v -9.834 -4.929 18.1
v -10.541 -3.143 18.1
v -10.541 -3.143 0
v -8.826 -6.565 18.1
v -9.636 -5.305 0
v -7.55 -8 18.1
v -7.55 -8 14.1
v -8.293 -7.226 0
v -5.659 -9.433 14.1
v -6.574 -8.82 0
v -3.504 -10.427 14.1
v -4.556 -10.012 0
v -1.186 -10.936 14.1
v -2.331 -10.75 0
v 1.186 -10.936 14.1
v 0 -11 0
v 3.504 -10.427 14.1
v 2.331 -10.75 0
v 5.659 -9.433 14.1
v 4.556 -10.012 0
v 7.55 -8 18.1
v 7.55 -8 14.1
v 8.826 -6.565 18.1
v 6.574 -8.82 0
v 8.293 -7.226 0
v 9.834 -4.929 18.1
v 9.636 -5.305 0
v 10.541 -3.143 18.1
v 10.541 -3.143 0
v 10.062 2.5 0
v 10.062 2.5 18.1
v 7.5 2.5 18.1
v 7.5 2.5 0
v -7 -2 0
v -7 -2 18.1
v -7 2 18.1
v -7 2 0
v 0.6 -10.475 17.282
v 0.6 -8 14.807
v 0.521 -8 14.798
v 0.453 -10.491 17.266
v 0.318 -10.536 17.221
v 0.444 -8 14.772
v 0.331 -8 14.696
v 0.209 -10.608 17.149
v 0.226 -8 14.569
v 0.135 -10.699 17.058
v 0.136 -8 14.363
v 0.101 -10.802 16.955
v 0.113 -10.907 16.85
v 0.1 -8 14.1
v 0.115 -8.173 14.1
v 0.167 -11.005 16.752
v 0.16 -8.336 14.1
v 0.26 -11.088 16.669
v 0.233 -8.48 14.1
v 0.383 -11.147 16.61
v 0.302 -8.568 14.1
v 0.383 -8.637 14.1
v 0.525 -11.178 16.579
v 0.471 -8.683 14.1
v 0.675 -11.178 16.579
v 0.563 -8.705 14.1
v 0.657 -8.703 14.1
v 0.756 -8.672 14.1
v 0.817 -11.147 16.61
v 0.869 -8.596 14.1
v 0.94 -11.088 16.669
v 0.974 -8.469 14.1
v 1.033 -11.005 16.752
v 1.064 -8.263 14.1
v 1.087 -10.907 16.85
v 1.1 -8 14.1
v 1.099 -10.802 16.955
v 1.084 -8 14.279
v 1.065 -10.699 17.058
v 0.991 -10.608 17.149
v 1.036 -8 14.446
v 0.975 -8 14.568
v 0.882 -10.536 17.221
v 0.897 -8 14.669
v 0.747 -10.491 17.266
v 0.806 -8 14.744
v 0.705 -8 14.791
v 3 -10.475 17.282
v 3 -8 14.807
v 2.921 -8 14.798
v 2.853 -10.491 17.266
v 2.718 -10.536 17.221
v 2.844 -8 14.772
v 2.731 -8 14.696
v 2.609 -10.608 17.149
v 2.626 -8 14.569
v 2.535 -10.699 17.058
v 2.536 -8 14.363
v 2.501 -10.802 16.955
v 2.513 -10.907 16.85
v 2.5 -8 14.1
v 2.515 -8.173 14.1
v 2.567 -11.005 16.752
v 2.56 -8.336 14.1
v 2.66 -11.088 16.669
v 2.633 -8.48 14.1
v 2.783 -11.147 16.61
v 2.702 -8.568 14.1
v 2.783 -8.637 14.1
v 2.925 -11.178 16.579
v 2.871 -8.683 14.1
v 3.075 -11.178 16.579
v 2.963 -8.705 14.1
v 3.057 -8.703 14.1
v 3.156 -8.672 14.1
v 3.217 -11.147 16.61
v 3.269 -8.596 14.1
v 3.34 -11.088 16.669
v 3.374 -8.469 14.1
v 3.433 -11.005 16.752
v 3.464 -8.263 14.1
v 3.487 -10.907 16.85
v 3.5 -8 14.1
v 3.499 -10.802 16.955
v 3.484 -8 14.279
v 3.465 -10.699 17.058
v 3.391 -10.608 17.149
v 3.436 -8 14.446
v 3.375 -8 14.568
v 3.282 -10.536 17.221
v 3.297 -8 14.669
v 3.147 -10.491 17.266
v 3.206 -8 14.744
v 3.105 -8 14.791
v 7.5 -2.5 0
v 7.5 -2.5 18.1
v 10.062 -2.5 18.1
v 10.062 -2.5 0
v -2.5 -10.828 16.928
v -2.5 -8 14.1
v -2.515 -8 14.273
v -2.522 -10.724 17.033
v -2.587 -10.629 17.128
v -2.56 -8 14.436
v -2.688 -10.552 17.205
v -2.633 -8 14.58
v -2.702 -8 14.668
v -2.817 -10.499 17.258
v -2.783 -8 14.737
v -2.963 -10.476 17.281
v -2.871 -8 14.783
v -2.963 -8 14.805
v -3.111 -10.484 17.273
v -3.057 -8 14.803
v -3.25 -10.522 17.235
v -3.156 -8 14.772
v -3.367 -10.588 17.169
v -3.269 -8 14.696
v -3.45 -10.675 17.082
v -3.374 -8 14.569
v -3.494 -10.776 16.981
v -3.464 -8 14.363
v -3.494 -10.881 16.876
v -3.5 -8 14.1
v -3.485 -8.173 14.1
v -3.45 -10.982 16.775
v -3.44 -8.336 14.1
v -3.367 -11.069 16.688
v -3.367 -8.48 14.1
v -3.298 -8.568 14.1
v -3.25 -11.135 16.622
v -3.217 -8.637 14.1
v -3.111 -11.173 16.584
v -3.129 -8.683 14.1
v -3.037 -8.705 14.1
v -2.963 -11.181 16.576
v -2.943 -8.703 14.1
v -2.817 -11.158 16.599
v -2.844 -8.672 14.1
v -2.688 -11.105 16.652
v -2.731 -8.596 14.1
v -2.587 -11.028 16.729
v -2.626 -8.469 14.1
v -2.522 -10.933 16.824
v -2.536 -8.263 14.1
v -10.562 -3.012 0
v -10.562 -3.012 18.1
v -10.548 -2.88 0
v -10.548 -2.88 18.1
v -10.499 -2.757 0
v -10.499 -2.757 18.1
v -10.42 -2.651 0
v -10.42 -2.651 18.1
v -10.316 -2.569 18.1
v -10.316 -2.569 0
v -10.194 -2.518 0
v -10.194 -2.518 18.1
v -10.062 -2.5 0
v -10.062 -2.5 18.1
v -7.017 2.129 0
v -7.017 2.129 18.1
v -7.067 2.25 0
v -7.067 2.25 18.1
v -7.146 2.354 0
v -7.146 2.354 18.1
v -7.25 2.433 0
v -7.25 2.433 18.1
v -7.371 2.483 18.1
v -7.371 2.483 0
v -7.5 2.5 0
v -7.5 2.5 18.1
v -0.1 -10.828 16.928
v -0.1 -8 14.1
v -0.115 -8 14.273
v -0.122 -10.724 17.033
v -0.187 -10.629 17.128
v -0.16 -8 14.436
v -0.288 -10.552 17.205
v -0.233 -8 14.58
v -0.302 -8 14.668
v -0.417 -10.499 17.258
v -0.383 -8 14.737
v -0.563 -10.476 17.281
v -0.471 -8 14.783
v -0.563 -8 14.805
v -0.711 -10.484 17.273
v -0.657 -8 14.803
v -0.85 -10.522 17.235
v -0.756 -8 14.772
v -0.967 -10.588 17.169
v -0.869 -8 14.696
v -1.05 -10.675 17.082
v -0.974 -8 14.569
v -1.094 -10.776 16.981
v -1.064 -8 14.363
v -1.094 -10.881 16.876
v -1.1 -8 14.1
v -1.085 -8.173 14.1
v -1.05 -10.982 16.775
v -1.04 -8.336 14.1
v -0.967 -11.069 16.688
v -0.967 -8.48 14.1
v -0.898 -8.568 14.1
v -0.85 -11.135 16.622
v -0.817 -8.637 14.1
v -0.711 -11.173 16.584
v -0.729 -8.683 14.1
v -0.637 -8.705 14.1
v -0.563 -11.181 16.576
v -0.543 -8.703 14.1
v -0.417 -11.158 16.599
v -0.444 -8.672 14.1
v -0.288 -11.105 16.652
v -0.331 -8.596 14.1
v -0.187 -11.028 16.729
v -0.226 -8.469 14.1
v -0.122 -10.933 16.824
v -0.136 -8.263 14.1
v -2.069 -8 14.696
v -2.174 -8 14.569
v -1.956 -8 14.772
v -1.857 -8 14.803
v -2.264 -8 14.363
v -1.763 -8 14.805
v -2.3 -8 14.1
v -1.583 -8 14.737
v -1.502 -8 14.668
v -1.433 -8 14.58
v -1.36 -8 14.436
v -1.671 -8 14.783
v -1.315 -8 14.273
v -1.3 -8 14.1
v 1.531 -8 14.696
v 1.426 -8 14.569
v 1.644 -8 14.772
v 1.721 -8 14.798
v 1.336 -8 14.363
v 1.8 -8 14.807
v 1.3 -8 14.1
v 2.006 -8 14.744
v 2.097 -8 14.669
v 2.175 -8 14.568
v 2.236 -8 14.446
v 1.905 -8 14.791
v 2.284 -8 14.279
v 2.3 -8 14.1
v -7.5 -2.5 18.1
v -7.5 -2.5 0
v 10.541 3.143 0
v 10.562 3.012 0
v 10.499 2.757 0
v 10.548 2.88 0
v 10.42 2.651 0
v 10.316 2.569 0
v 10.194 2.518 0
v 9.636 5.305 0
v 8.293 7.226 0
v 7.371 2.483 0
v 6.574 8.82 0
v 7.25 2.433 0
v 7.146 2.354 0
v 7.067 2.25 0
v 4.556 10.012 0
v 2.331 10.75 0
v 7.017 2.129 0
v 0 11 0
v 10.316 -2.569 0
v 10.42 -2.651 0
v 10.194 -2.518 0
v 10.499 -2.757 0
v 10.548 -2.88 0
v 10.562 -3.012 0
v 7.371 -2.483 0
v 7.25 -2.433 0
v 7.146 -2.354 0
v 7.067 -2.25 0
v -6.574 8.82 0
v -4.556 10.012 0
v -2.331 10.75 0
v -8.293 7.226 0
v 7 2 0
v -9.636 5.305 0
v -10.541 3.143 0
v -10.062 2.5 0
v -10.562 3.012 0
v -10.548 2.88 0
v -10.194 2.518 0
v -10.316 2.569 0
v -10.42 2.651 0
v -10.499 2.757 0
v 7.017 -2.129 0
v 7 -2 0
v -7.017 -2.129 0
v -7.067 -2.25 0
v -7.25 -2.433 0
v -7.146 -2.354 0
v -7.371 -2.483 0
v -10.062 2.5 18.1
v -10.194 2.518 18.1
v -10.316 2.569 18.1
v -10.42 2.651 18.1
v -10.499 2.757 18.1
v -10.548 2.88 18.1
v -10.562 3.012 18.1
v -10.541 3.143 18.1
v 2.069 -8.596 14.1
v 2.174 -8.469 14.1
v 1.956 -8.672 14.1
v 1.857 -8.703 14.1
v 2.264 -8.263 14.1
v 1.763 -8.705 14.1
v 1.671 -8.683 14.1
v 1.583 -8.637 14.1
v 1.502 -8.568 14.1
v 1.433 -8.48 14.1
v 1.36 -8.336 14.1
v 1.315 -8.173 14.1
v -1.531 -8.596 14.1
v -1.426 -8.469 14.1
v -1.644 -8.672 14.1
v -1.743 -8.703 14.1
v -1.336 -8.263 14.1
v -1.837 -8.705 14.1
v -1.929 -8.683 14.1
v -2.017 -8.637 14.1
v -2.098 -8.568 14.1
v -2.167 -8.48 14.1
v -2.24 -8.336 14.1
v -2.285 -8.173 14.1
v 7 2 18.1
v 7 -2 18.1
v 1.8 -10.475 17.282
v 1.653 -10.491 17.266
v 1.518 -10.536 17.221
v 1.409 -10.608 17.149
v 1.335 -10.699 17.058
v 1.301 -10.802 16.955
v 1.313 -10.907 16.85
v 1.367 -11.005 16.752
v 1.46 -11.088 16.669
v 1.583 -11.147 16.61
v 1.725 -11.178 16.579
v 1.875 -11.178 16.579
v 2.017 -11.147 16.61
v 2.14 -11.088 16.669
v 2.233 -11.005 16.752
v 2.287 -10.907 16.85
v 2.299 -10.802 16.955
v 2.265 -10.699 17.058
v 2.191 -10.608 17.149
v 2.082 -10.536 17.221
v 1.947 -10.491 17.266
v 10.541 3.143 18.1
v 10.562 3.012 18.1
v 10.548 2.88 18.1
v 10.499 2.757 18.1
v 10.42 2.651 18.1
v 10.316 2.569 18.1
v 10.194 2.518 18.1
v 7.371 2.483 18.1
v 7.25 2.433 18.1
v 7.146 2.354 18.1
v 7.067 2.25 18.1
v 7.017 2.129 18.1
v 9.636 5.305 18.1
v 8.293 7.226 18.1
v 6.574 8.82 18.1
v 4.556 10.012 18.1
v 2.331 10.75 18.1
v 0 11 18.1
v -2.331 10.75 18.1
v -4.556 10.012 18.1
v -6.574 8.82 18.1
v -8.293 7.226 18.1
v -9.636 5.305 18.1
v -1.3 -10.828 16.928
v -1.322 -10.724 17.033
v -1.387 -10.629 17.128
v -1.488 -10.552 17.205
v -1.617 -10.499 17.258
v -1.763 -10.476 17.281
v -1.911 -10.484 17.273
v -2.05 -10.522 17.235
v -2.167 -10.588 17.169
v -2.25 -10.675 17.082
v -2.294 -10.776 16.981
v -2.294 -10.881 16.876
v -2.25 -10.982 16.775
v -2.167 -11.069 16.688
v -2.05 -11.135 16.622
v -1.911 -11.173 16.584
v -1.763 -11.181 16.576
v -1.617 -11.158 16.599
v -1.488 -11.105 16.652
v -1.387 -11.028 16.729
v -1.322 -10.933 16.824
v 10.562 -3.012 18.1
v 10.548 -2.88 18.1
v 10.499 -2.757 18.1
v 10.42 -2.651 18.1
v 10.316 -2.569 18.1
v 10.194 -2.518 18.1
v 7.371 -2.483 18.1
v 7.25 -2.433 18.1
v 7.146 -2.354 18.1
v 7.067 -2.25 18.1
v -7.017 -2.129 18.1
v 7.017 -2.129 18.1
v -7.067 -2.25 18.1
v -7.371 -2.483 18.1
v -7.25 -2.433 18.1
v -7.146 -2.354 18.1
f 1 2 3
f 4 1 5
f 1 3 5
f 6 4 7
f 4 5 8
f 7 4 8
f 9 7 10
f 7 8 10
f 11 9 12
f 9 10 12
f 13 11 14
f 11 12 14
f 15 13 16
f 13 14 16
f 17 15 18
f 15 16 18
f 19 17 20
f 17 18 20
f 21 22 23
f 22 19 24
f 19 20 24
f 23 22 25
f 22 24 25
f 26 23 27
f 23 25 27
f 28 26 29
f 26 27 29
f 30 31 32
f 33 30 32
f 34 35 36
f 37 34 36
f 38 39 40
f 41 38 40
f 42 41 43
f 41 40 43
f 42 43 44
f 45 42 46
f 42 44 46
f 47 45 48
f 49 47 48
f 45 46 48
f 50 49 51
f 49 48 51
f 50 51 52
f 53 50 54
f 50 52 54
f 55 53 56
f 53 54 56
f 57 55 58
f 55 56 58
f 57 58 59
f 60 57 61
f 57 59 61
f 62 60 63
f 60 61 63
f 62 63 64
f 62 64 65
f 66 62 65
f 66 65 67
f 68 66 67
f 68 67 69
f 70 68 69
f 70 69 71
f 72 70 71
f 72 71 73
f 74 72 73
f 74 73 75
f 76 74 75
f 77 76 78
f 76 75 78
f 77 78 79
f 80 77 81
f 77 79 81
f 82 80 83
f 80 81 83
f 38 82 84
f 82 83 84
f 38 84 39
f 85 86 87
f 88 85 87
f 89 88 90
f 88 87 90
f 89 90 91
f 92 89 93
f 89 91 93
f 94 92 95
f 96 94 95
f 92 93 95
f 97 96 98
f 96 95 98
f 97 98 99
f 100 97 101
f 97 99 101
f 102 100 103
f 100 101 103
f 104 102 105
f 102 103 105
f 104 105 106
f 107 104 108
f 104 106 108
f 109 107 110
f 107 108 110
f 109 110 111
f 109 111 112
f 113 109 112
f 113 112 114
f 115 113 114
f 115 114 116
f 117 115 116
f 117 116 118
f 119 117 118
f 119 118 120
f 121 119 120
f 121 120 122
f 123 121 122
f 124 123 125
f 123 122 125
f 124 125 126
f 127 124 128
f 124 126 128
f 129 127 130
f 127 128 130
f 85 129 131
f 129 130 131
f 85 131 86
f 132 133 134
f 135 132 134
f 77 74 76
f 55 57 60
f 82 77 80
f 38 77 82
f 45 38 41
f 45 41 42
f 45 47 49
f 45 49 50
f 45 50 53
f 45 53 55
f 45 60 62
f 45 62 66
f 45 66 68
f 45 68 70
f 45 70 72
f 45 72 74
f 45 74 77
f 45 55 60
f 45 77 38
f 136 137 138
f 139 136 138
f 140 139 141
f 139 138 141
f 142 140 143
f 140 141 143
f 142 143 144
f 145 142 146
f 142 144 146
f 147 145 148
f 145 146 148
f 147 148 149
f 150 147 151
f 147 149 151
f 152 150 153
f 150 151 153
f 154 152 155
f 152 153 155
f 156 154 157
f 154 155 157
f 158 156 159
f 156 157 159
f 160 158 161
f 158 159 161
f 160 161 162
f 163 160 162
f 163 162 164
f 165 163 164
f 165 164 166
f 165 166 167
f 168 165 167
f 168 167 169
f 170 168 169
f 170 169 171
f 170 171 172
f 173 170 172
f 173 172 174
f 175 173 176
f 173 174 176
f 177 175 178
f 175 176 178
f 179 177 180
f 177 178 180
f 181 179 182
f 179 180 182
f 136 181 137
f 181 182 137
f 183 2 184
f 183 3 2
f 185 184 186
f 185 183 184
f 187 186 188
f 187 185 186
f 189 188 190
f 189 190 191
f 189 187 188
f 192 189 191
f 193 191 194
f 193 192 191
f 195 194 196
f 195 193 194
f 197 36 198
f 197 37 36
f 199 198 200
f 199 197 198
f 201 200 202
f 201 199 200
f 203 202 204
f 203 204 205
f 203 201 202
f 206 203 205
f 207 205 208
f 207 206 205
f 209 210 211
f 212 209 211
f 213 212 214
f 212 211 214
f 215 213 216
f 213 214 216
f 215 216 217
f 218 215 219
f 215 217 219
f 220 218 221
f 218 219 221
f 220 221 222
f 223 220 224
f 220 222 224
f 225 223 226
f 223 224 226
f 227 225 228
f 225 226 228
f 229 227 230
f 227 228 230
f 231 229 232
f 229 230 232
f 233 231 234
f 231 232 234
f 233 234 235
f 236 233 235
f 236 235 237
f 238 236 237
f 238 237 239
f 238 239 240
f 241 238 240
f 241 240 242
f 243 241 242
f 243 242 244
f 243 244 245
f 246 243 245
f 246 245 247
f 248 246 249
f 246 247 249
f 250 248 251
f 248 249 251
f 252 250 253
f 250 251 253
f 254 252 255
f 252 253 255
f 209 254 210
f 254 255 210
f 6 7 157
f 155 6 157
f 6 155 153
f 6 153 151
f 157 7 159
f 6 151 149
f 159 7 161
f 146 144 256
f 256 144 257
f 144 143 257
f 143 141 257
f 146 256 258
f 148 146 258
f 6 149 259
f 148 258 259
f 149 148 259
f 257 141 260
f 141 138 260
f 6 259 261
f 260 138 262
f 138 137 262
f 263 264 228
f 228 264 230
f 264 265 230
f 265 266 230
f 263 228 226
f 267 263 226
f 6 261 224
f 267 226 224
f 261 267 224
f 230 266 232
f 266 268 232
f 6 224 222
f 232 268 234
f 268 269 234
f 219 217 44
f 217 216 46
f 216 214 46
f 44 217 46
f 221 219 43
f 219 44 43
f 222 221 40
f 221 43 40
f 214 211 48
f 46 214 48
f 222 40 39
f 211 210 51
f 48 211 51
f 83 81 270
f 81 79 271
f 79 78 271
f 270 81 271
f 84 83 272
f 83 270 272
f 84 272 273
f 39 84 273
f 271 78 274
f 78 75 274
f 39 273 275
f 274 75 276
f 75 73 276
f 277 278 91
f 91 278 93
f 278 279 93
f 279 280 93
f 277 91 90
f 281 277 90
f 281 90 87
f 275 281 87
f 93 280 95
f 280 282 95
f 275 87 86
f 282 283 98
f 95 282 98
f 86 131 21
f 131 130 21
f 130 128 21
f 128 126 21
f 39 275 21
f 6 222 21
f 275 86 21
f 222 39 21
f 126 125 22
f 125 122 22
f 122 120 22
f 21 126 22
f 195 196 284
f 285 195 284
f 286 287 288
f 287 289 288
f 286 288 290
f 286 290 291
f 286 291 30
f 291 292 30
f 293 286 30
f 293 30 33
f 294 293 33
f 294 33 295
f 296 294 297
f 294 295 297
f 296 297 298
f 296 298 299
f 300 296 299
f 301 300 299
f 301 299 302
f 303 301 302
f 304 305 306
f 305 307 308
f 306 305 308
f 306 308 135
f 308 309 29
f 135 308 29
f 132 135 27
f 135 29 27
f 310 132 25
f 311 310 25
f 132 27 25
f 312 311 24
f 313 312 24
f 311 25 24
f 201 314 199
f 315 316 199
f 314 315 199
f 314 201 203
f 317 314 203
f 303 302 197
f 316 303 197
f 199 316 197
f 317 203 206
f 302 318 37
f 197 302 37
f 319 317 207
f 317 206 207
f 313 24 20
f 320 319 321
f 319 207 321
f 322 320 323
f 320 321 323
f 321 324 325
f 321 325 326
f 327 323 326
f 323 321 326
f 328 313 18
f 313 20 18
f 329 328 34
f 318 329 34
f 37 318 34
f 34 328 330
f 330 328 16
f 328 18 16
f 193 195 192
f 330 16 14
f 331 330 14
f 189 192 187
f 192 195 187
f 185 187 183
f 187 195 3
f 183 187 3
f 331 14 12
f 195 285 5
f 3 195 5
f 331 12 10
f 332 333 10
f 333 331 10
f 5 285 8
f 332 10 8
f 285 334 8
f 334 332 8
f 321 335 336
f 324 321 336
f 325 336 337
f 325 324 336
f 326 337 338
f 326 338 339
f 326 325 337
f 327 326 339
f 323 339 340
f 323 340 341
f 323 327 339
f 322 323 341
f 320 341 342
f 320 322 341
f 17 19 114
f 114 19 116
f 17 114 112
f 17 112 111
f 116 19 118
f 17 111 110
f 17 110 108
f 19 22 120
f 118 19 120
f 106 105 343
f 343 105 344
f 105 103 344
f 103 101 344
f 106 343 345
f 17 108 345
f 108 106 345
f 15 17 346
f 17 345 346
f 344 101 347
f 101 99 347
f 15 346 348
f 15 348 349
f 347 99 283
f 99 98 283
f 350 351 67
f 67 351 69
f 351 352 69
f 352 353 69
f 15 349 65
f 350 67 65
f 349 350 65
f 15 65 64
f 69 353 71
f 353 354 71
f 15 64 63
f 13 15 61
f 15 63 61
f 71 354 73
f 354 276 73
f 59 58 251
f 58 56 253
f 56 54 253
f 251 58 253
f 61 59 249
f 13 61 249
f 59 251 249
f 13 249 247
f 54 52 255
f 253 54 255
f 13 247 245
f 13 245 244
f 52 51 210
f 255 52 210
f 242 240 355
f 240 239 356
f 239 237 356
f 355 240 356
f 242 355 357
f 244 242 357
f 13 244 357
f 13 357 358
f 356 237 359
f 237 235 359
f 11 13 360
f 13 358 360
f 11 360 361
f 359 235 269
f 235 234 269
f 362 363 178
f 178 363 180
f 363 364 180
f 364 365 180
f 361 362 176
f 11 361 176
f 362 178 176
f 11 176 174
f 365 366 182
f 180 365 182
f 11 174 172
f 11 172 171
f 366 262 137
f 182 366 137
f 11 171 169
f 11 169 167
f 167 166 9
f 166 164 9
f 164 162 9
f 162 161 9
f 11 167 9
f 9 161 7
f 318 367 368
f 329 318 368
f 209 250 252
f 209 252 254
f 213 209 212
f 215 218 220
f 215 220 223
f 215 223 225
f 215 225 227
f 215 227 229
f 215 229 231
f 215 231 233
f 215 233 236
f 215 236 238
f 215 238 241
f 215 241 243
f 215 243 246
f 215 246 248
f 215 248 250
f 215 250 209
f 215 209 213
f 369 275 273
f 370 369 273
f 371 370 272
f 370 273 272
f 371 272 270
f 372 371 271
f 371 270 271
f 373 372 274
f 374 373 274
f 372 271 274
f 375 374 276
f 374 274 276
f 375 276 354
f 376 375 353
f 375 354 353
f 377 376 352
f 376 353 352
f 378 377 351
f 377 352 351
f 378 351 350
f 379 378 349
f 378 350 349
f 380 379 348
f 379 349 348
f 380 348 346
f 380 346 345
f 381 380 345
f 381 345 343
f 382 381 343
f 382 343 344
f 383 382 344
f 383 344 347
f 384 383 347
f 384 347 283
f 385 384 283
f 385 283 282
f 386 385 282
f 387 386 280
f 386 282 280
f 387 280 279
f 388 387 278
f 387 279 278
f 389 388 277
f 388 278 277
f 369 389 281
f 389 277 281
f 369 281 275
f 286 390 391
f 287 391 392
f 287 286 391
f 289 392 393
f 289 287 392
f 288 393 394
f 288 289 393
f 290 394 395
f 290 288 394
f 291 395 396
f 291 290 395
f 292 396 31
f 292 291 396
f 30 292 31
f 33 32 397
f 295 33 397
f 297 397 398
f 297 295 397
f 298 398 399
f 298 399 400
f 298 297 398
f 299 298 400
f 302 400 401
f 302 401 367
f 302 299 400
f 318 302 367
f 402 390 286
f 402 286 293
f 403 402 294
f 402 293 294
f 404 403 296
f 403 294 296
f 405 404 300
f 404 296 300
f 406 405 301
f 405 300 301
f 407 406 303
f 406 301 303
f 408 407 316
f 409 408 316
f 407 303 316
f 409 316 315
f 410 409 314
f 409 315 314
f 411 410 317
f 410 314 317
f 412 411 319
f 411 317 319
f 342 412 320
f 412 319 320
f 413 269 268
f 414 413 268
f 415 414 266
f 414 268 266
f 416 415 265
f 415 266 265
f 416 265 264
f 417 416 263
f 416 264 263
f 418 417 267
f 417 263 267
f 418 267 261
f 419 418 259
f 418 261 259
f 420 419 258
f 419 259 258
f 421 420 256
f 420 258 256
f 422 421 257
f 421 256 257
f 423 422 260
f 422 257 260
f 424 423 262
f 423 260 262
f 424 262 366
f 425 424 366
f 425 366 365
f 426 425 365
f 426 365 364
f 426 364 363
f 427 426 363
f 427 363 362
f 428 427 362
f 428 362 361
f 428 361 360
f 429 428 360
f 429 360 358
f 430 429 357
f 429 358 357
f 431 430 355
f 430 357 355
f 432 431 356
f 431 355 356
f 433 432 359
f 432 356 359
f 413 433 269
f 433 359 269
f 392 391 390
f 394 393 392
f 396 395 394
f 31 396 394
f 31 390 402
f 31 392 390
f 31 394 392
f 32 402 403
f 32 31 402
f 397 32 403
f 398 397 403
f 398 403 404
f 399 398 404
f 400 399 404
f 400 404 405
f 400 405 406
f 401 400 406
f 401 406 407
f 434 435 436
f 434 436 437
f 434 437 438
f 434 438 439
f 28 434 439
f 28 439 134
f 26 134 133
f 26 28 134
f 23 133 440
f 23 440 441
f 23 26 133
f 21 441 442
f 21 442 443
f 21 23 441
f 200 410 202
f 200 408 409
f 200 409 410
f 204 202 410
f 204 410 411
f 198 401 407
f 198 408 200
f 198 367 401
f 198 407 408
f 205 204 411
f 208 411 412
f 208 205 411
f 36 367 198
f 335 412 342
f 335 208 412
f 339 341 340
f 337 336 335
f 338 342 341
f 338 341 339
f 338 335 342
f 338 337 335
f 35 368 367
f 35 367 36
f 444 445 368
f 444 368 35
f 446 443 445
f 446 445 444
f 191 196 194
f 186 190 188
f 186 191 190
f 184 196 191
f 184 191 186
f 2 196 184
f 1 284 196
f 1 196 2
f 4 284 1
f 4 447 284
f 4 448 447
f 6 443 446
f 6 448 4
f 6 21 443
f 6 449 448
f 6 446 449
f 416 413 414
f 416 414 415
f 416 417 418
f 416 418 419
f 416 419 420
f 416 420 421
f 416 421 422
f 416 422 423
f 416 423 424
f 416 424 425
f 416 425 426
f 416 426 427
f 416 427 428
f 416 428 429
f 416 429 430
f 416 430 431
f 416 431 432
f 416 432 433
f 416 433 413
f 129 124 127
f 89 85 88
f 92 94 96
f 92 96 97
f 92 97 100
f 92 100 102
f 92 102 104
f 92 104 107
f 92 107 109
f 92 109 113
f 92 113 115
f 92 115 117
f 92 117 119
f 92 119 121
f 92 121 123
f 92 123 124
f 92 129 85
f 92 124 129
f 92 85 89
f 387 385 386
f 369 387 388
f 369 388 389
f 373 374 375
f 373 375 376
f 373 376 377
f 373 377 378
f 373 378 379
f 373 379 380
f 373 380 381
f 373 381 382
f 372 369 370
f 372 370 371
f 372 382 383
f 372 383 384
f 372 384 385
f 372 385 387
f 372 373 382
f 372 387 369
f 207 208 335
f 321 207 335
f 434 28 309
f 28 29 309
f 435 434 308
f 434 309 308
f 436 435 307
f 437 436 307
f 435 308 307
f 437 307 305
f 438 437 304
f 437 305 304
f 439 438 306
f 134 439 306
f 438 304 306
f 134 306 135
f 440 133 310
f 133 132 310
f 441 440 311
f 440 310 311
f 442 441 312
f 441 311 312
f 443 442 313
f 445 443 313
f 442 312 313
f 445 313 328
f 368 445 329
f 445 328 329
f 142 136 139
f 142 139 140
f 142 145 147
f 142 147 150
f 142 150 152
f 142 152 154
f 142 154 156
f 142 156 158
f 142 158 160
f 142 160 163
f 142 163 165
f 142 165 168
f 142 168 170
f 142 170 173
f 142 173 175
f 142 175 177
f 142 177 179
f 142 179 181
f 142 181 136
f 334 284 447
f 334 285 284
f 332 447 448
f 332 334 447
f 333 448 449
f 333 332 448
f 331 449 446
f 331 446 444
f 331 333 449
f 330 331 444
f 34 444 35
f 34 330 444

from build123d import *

# Parameters (mm, degrees)
ESQUISSE1_R             = 11
BOSS_EXTRU_1_DEPTH      = 18.1
ENL_V_MAT_EXTRU_2_DEPTH = 24.866503724
ENL_V_START             = -4
ENL_V_MAT_EXTRU_3_DEPTH = 4
CONG_1_R                = 0.5
ESQUISSE6_R             = 0.5
BOSS_EXTRU_2_DEPTH      = 4


with BuildPart() as part:
    # Esquisse1 → Boss.-Extru.1 (new body)
    with BuildSketch(Plane.XY):
        with Locations(Location((0, 0, 0), (0, 0, 180))):
            Circle(ESQUISSE1_R)
    extrude(amount=BOSS_EXTRU_1_DEPTH)

    # Esquisse4 → Enlèv. mat.-Extru.2 (cut, through all)
    with BuildSketch(Plane.XY.offset(18.1)):
        with BuildLine():
            Line((10.712142643, 2.5), (7, 2.5))
            Line((7, 2.5), (7, -2.5))
            Line((7, -2.5), (10.712142643, -2.5))
            ThreePointArc((10.712142643, -2.5), (11, 0), (10.712142643, 2.5))
        make_face()
        with BuildLine():
            Line((-10.712142643, -2.5), (-7, -2.5))
            Line((-7, -2.5), (-7, 2.5))
            Line((-7, 2.5), (-10.712142643, 2.5))
            ThreePointArc((-10.712142643, 2.5), (-11, 0), (-10.712142643, -2.5))
        make_face()
    extrude(amount=-ENL_V_MAT_EXTRU_2_DEPTH, mode=Mode.SUBTRACT)

    # Esquisse5 → Enlèv. mat.-Extru.3 (cut)
    with BuildSketch(Plane.XY.offset(18.1).offset(ENL_V_START)):
        with BuildLine():
            Line((-7.549834435, -8), (7.549834435, -8))
            ThreePointArc((7.549834435, -8), (0, -11), (-7.549834435, -8))
        make_face()
    extrude(amount=ENL_V_MAT_EXTRU_3_DEPTH, mode=Mode.SUBTRACT)

    # Congé1
    cong_1_edges = [part.edges().sort_by_distance(p)[0] for p in [
        (10.712142643, 2.5, 9.05),
        (10.712142643, -2.5, 9.05),
        (7, -2.5, 9.05),
        (7, 2.5, 9.05),
        (-10.712142643, -2.5, 9.05),
        (-10.712142643, 2.5, 9.05),
        (-7, 2.5, 9.05),
        (-7, -2.5, 9.05),
    ]]
    fillet(cong_1_edges, radius=CONG_1_R)

    # Esquisse6 → Boss.-Extru.2 (add)
    with BuildSketch(Plane(origin=(0, -11.05, 11.05), x_dir=(-1, 0, 0), z_dir=(0, -0.7071067811865464, 0.7071067811865488))):
        with Locations(Location((0.6, -4.313351365, 0), (0, 0, 180))):
            Circle(ESQUISSE6_R)
        with Locations(Location((1.8, -4.313351365, 0), (0, 0, 180))):
            Circle(ESQUISSE6_R)
        with Locations(Location((3, -4.313351365, 0), (0, 0, 180))):
            Circle(ESQUISSE6_R)
        with Locations(Location((-3, -4.313351365, 0), (0, 0, 270))):
            Circle(ESQUISSE6_R)
        with Locations(Location((-1.8, -4.313351365, 0), (0, 0, 270))):
            Circle(ESQUISSE6_R)
        with Locations(Location((-0.6, -4.313351365, 0), (0, 0, 270))):
            Circle(ESQUISSE6_R)
    extrude(amount=BOSS_EXTRU_2_DEPTH)


solid = part.part
